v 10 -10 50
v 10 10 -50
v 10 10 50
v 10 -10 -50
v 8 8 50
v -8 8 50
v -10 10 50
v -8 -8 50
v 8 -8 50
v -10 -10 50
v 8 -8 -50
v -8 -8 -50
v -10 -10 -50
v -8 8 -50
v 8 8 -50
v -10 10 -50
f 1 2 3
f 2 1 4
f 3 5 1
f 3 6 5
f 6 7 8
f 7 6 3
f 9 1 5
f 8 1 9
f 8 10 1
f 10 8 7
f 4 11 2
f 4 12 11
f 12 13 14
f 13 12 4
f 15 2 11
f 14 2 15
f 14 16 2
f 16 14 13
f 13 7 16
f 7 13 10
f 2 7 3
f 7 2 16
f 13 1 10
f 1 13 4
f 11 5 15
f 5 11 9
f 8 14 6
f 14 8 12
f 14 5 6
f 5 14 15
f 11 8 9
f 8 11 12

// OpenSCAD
// Aluminium rectangular box section: 20mm x 20mm x 2mm wall

outer_size = 20;        // mm
wall_thickness = 2;     // mm
length = 100;           // mm

eps = 0.02;             // small overlap to avoid coplanar faces

module box_section_20x20x2(L=length, OD=outer_size, t=wall_thickness) {
    ID = OD - 2*t;
    assert(ID > 0, "Wall thickness too large for given outer size.");

    // Centered for predictable viewing/orientation
    difference() {
        cube([OD, OD, L], center=true);
        cube([ID, ID, L + 2*eps], center=true);
    }
}

box_section_20x20x2();
